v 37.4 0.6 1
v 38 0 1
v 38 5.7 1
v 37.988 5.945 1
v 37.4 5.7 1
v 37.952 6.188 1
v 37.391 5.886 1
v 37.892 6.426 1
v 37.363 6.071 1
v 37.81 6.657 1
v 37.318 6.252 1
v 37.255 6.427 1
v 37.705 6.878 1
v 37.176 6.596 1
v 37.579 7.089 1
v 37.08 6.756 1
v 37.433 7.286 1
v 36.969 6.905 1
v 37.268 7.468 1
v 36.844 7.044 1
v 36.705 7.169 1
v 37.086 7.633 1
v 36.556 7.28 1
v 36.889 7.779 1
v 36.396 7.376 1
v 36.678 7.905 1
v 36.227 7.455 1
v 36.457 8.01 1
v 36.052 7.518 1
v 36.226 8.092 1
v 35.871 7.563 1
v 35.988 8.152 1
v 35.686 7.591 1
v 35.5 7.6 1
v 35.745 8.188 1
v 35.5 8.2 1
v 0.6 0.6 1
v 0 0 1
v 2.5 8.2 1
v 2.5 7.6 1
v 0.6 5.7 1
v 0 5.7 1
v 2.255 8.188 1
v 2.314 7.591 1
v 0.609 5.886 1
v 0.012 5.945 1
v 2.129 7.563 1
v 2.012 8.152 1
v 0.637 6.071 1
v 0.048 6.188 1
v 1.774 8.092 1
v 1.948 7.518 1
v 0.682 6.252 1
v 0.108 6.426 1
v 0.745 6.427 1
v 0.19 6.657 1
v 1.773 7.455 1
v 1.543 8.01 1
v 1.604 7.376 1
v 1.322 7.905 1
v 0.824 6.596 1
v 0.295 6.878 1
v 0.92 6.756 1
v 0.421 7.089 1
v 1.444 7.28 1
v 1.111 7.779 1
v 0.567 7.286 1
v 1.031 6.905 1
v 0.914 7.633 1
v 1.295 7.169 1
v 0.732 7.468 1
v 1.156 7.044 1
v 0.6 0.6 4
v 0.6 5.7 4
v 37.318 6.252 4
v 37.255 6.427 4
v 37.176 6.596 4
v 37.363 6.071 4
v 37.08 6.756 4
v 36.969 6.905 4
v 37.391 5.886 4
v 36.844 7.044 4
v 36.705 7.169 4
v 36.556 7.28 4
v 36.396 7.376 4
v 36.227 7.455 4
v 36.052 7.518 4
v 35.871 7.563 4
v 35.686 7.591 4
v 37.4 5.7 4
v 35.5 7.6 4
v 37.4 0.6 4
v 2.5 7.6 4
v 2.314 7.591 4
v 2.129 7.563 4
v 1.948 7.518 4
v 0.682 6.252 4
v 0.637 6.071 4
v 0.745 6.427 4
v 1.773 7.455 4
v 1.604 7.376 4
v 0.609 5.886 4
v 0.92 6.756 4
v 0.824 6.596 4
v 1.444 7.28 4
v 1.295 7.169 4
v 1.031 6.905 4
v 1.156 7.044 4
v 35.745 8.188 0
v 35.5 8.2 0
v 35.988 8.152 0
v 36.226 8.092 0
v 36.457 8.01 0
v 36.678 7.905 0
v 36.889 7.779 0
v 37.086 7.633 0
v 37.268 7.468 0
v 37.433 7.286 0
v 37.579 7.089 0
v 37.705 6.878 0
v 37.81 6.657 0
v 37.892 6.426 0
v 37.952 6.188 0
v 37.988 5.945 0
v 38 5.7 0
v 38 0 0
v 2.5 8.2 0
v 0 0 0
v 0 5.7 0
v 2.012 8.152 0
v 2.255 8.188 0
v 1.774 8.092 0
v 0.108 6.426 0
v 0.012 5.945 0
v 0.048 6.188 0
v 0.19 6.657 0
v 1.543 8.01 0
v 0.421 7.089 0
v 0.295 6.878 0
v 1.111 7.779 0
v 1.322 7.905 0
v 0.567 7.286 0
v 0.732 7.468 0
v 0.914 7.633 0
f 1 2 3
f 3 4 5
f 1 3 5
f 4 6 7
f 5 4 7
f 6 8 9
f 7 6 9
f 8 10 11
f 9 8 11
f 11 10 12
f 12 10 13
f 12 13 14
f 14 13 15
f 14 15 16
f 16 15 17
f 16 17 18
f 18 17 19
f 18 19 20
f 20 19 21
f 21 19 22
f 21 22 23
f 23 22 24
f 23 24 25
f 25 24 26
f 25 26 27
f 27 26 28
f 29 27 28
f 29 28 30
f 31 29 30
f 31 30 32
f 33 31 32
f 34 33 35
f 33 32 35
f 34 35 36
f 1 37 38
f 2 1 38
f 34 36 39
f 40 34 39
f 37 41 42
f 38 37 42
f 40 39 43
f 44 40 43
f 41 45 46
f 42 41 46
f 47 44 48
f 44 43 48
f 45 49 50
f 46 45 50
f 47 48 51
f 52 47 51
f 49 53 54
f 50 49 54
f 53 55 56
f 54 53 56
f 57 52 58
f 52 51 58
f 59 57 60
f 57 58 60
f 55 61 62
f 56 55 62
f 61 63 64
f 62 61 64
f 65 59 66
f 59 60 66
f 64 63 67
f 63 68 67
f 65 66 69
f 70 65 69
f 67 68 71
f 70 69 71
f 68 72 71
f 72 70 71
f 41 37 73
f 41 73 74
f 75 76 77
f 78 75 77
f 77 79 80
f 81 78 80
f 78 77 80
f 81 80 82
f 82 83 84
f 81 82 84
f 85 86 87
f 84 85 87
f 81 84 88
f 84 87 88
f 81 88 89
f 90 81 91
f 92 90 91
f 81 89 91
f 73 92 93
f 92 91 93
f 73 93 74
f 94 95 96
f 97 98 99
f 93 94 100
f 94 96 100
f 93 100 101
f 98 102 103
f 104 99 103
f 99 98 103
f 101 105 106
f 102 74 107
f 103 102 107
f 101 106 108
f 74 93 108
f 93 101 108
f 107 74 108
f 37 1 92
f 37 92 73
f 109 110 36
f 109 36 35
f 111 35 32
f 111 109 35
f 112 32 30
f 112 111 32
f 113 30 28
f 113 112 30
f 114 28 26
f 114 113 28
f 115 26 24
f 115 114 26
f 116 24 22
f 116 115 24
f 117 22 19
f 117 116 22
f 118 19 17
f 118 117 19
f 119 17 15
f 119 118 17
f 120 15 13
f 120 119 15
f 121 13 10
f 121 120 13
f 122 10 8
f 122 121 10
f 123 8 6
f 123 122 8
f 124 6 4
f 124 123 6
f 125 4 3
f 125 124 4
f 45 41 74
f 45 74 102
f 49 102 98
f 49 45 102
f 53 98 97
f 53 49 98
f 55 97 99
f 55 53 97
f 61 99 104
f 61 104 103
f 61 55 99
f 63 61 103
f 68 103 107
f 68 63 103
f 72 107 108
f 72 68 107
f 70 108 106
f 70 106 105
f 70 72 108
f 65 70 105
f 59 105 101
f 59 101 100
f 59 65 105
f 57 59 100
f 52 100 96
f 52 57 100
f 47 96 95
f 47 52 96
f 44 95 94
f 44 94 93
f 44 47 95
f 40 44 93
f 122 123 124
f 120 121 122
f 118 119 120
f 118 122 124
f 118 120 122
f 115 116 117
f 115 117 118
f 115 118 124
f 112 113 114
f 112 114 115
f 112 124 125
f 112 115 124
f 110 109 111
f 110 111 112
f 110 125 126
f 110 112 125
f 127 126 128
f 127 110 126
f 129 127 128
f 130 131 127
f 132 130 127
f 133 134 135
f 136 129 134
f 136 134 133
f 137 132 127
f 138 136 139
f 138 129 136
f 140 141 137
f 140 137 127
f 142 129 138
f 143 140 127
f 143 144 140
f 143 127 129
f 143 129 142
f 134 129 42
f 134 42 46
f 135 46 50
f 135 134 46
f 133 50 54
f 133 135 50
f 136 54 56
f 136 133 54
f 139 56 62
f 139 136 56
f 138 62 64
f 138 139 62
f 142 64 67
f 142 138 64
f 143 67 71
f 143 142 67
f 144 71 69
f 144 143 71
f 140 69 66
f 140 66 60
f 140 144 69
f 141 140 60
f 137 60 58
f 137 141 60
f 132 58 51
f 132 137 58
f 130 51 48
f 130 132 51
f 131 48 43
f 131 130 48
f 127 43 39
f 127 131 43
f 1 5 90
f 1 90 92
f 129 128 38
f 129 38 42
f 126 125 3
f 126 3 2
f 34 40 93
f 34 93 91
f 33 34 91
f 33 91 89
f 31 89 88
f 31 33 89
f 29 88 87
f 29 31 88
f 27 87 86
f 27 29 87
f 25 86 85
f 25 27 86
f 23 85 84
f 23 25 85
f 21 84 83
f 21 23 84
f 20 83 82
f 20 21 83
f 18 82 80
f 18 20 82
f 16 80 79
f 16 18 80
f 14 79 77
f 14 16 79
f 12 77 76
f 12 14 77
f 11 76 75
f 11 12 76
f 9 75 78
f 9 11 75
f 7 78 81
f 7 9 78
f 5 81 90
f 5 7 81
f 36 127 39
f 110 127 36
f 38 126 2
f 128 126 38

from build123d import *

# Parameters (mm, degrees)
BOSS_EXTRUDE1_DEPTH = 1
BOSS_EXTRUDE2_DEPTH = 3


with BuildPart() as part:
    # Sketch1 → Boss-Extrude1 (new body)
    with BuildSketch(Plane.XY):
        with BuildLine():
            Line((0, 0), (0, 5.7))
            ThreePointArc((0, 5.7), (0.732233047, 7.467766953), (2.5, 8.2))
            Line((2.5, 8.2), (35.5, 8.2))
            ThreePointArc((35.5, 8.2), (37.267766953, 7.467766953), (38, 5.7))
            Line((38, 5.7), (38, 0))
            Line((38, 0), (0, 0))
        make_face()
    extrude(amount=BOSS_EXTRUDE1_DEPTH)

    # Sketch2 → Boss-Extrude2 (add)
    with BuildSketch(Plane.XY.offset(1)):
        with BuildLine():
            Line((0.6, 0.6), (0.6, 5.7))
            ThreePointArc((0.6, 5.7), (1.156497116, 7.043502884), (2.5, 7.6))
            Line((2.5, 7.6), (35.5, 7.6))
            ThreePointArc((35.5, 7.6), (36.843502884, 7.043502884), (37.4, 5.7))
            Line((37.4, 5.7), (37.4, 0.6))
            Line((37.4, 0.6), (0.6, 0.6))
        make_face()
    extrude(amount=BOSS_EXTRUDE2_DEPTH)


solid = part.part
